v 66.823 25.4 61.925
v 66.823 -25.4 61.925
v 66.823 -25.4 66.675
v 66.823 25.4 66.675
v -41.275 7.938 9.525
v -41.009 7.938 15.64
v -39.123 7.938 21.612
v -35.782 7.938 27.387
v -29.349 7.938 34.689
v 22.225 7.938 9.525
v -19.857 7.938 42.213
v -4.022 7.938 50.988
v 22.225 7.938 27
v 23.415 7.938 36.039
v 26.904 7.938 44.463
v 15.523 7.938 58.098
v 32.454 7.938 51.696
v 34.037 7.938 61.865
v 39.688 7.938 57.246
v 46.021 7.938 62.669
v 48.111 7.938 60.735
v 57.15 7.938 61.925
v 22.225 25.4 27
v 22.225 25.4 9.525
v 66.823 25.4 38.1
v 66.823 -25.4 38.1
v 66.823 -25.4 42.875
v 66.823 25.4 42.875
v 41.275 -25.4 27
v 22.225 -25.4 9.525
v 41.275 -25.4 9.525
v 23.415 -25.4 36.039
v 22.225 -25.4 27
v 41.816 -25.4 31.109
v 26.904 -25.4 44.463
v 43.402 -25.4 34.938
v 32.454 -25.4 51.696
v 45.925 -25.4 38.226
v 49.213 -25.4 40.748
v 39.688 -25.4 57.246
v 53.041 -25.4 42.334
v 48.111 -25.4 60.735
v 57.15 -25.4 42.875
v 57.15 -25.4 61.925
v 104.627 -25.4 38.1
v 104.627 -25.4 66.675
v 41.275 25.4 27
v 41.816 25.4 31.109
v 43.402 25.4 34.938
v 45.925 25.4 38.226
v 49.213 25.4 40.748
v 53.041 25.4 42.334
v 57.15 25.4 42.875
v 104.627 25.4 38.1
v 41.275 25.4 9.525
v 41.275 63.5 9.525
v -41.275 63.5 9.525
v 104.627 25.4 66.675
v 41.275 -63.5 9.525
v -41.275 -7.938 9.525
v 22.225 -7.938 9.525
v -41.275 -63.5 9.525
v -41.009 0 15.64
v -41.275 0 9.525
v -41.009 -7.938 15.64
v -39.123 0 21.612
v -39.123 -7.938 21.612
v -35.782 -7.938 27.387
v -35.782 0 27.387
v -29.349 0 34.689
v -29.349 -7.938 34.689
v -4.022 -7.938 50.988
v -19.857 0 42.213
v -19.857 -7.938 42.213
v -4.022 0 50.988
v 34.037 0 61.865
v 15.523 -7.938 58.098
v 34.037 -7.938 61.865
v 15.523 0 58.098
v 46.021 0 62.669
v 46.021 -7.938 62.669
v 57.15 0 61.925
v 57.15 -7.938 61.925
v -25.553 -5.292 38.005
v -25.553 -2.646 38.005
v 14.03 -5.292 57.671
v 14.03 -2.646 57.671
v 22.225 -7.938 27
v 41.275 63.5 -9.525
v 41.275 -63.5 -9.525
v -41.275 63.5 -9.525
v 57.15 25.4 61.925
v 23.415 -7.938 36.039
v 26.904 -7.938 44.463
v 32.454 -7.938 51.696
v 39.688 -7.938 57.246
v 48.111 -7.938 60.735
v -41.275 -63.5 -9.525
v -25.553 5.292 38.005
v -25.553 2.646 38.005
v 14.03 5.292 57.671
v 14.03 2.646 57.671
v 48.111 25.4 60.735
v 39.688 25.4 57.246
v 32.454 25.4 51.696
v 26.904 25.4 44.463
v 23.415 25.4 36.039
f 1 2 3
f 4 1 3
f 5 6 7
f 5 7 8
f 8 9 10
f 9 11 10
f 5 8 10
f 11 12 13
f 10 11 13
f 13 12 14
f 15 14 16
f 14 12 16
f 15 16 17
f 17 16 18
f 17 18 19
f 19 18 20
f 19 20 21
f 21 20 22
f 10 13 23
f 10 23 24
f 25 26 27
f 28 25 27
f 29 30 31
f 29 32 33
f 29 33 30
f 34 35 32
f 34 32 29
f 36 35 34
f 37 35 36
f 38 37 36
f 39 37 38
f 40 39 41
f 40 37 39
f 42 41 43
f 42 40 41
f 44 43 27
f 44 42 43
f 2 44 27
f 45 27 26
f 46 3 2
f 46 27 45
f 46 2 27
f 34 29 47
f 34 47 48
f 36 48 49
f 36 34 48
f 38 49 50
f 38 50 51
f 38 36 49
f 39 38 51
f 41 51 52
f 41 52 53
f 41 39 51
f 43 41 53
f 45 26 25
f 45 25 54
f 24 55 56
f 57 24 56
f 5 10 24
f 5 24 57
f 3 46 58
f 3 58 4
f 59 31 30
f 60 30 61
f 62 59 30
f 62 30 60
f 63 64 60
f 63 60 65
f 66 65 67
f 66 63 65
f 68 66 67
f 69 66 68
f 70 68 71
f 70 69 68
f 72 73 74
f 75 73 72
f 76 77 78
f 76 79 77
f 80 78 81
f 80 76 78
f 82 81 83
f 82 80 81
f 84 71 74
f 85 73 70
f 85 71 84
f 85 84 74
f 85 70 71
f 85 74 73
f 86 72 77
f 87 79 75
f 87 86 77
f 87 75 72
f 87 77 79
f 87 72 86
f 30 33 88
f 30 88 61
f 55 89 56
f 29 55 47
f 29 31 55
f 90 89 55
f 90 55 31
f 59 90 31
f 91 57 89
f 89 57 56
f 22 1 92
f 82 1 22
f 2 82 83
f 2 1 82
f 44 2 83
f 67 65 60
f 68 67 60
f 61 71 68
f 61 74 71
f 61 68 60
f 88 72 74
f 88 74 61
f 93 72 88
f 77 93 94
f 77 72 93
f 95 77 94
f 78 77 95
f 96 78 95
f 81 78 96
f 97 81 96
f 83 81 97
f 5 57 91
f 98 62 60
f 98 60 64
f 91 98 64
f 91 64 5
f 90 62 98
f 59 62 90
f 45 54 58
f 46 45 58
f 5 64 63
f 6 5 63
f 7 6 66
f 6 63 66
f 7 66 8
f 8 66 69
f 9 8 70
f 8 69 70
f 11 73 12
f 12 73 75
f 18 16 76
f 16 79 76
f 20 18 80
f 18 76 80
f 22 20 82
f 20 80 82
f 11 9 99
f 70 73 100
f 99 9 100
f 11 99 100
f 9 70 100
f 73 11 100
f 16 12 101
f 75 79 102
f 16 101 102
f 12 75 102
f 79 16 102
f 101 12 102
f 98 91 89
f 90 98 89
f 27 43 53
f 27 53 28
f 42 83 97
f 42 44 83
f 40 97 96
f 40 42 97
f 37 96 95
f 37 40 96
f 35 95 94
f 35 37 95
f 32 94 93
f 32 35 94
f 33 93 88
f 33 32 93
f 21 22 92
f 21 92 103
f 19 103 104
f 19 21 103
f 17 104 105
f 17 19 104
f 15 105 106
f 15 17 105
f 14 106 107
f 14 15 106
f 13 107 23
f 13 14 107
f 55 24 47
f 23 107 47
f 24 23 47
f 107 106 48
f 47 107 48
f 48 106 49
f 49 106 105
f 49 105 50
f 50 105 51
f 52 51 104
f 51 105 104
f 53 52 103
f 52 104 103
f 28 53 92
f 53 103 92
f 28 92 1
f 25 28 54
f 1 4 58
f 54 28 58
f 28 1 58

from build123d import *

# Parameters (mm, degrees)
F1_DEPTH = 63.5
F0_W     = 18.9016429644
F0_H     = 19.05
F0_H_2   = 4.7498
F0_H_3   = 4.7752
F2_DEPTH = 25.4
F3_DEPTH = 7.9375


with BuildPart() as f1:
    # F0 (on Front) → F1 (new body, symmetric)
    with BuildSketch(Plane.XZ):
        Polygon((41.275, -9.525), (41.275, 9.525), (22.225, 9.525), (-41.275, 9.525), (-41.275, -9.525), align=None)
    extrude(amount=F1_DEPTH, both=True)

    # F0 (on Front) → F2 (join, symmetric)
    with BuildSketch(Plane.XZ):
        with BuildLine():
            Line((22.225, 9.525), (41.275, 9.525))
            Line((41.275, 9.525), (41.275, 27.0002))
            ThreePointArc((41.275, 27.0002), (45.9246798487, 38.2255201513), (57.15, 42.8752))
            Line((57.15, 42.8752), (66.8233570356, 42.8752))
            Line((66.8233570356, 42.8752), (66.8233570356, 61.9252))
            Line((66.8233570356, 61.9252), (57.15, 61.9252))
            ThreePointArc((57.15, 61.9252), (32.4542956671, 51.6959043329), (22.225, 27.0002))
            Line((22.225, 27.0002), (22.225, 9.525))
        make_face()
        with Locations((76.2741785178, 52.4002)):
            Rectangle(F0_W, F0_H)
        Polygon((85.725, 61.9252), (85.725, 42.8752), (85.725, 38.1), (104.6266429644, 38.1), (104.6266429644, 66.675), (85.725, 66.675), align=None)
        with Locations((76.2741785178, 64.3001)):
            Rectangle(F0_W, F0_H_2)
        with Locations((76.2741785178, 40.4876)):
            Rectangle(F0_W, F0_H_3)
    extrude(amount=F2_DEPTH, both=True)

    # F0 (on Front) → F3 (join, symmetric)
    with BuildSketch(Plane.XZ):
        with BuildLine():
            Line((-41.275, 9.525), (22.225, 9.525))
            Line((22.225, 9.525), (22.225, 27.0002))
            ThreePointArc((22.225, 27.0002), (32.4542956671, 51.6959043329), (57.15, 61.9252))
            add(Edge.make_bspline(
                [(-41.275, 9.525), (-44.257581234, 40.212534368), (19.0355218947, 67.5760954618), (57.15, 61.9252)],
                knots=[0, 0, 0, 0, 111.5045361635, 111.5045361635, 111.5045361635, 111.5045361635], degree=3))
        make_face()
    extrude(amount=F3_DEPTH, both=True)


solid = f1.part
